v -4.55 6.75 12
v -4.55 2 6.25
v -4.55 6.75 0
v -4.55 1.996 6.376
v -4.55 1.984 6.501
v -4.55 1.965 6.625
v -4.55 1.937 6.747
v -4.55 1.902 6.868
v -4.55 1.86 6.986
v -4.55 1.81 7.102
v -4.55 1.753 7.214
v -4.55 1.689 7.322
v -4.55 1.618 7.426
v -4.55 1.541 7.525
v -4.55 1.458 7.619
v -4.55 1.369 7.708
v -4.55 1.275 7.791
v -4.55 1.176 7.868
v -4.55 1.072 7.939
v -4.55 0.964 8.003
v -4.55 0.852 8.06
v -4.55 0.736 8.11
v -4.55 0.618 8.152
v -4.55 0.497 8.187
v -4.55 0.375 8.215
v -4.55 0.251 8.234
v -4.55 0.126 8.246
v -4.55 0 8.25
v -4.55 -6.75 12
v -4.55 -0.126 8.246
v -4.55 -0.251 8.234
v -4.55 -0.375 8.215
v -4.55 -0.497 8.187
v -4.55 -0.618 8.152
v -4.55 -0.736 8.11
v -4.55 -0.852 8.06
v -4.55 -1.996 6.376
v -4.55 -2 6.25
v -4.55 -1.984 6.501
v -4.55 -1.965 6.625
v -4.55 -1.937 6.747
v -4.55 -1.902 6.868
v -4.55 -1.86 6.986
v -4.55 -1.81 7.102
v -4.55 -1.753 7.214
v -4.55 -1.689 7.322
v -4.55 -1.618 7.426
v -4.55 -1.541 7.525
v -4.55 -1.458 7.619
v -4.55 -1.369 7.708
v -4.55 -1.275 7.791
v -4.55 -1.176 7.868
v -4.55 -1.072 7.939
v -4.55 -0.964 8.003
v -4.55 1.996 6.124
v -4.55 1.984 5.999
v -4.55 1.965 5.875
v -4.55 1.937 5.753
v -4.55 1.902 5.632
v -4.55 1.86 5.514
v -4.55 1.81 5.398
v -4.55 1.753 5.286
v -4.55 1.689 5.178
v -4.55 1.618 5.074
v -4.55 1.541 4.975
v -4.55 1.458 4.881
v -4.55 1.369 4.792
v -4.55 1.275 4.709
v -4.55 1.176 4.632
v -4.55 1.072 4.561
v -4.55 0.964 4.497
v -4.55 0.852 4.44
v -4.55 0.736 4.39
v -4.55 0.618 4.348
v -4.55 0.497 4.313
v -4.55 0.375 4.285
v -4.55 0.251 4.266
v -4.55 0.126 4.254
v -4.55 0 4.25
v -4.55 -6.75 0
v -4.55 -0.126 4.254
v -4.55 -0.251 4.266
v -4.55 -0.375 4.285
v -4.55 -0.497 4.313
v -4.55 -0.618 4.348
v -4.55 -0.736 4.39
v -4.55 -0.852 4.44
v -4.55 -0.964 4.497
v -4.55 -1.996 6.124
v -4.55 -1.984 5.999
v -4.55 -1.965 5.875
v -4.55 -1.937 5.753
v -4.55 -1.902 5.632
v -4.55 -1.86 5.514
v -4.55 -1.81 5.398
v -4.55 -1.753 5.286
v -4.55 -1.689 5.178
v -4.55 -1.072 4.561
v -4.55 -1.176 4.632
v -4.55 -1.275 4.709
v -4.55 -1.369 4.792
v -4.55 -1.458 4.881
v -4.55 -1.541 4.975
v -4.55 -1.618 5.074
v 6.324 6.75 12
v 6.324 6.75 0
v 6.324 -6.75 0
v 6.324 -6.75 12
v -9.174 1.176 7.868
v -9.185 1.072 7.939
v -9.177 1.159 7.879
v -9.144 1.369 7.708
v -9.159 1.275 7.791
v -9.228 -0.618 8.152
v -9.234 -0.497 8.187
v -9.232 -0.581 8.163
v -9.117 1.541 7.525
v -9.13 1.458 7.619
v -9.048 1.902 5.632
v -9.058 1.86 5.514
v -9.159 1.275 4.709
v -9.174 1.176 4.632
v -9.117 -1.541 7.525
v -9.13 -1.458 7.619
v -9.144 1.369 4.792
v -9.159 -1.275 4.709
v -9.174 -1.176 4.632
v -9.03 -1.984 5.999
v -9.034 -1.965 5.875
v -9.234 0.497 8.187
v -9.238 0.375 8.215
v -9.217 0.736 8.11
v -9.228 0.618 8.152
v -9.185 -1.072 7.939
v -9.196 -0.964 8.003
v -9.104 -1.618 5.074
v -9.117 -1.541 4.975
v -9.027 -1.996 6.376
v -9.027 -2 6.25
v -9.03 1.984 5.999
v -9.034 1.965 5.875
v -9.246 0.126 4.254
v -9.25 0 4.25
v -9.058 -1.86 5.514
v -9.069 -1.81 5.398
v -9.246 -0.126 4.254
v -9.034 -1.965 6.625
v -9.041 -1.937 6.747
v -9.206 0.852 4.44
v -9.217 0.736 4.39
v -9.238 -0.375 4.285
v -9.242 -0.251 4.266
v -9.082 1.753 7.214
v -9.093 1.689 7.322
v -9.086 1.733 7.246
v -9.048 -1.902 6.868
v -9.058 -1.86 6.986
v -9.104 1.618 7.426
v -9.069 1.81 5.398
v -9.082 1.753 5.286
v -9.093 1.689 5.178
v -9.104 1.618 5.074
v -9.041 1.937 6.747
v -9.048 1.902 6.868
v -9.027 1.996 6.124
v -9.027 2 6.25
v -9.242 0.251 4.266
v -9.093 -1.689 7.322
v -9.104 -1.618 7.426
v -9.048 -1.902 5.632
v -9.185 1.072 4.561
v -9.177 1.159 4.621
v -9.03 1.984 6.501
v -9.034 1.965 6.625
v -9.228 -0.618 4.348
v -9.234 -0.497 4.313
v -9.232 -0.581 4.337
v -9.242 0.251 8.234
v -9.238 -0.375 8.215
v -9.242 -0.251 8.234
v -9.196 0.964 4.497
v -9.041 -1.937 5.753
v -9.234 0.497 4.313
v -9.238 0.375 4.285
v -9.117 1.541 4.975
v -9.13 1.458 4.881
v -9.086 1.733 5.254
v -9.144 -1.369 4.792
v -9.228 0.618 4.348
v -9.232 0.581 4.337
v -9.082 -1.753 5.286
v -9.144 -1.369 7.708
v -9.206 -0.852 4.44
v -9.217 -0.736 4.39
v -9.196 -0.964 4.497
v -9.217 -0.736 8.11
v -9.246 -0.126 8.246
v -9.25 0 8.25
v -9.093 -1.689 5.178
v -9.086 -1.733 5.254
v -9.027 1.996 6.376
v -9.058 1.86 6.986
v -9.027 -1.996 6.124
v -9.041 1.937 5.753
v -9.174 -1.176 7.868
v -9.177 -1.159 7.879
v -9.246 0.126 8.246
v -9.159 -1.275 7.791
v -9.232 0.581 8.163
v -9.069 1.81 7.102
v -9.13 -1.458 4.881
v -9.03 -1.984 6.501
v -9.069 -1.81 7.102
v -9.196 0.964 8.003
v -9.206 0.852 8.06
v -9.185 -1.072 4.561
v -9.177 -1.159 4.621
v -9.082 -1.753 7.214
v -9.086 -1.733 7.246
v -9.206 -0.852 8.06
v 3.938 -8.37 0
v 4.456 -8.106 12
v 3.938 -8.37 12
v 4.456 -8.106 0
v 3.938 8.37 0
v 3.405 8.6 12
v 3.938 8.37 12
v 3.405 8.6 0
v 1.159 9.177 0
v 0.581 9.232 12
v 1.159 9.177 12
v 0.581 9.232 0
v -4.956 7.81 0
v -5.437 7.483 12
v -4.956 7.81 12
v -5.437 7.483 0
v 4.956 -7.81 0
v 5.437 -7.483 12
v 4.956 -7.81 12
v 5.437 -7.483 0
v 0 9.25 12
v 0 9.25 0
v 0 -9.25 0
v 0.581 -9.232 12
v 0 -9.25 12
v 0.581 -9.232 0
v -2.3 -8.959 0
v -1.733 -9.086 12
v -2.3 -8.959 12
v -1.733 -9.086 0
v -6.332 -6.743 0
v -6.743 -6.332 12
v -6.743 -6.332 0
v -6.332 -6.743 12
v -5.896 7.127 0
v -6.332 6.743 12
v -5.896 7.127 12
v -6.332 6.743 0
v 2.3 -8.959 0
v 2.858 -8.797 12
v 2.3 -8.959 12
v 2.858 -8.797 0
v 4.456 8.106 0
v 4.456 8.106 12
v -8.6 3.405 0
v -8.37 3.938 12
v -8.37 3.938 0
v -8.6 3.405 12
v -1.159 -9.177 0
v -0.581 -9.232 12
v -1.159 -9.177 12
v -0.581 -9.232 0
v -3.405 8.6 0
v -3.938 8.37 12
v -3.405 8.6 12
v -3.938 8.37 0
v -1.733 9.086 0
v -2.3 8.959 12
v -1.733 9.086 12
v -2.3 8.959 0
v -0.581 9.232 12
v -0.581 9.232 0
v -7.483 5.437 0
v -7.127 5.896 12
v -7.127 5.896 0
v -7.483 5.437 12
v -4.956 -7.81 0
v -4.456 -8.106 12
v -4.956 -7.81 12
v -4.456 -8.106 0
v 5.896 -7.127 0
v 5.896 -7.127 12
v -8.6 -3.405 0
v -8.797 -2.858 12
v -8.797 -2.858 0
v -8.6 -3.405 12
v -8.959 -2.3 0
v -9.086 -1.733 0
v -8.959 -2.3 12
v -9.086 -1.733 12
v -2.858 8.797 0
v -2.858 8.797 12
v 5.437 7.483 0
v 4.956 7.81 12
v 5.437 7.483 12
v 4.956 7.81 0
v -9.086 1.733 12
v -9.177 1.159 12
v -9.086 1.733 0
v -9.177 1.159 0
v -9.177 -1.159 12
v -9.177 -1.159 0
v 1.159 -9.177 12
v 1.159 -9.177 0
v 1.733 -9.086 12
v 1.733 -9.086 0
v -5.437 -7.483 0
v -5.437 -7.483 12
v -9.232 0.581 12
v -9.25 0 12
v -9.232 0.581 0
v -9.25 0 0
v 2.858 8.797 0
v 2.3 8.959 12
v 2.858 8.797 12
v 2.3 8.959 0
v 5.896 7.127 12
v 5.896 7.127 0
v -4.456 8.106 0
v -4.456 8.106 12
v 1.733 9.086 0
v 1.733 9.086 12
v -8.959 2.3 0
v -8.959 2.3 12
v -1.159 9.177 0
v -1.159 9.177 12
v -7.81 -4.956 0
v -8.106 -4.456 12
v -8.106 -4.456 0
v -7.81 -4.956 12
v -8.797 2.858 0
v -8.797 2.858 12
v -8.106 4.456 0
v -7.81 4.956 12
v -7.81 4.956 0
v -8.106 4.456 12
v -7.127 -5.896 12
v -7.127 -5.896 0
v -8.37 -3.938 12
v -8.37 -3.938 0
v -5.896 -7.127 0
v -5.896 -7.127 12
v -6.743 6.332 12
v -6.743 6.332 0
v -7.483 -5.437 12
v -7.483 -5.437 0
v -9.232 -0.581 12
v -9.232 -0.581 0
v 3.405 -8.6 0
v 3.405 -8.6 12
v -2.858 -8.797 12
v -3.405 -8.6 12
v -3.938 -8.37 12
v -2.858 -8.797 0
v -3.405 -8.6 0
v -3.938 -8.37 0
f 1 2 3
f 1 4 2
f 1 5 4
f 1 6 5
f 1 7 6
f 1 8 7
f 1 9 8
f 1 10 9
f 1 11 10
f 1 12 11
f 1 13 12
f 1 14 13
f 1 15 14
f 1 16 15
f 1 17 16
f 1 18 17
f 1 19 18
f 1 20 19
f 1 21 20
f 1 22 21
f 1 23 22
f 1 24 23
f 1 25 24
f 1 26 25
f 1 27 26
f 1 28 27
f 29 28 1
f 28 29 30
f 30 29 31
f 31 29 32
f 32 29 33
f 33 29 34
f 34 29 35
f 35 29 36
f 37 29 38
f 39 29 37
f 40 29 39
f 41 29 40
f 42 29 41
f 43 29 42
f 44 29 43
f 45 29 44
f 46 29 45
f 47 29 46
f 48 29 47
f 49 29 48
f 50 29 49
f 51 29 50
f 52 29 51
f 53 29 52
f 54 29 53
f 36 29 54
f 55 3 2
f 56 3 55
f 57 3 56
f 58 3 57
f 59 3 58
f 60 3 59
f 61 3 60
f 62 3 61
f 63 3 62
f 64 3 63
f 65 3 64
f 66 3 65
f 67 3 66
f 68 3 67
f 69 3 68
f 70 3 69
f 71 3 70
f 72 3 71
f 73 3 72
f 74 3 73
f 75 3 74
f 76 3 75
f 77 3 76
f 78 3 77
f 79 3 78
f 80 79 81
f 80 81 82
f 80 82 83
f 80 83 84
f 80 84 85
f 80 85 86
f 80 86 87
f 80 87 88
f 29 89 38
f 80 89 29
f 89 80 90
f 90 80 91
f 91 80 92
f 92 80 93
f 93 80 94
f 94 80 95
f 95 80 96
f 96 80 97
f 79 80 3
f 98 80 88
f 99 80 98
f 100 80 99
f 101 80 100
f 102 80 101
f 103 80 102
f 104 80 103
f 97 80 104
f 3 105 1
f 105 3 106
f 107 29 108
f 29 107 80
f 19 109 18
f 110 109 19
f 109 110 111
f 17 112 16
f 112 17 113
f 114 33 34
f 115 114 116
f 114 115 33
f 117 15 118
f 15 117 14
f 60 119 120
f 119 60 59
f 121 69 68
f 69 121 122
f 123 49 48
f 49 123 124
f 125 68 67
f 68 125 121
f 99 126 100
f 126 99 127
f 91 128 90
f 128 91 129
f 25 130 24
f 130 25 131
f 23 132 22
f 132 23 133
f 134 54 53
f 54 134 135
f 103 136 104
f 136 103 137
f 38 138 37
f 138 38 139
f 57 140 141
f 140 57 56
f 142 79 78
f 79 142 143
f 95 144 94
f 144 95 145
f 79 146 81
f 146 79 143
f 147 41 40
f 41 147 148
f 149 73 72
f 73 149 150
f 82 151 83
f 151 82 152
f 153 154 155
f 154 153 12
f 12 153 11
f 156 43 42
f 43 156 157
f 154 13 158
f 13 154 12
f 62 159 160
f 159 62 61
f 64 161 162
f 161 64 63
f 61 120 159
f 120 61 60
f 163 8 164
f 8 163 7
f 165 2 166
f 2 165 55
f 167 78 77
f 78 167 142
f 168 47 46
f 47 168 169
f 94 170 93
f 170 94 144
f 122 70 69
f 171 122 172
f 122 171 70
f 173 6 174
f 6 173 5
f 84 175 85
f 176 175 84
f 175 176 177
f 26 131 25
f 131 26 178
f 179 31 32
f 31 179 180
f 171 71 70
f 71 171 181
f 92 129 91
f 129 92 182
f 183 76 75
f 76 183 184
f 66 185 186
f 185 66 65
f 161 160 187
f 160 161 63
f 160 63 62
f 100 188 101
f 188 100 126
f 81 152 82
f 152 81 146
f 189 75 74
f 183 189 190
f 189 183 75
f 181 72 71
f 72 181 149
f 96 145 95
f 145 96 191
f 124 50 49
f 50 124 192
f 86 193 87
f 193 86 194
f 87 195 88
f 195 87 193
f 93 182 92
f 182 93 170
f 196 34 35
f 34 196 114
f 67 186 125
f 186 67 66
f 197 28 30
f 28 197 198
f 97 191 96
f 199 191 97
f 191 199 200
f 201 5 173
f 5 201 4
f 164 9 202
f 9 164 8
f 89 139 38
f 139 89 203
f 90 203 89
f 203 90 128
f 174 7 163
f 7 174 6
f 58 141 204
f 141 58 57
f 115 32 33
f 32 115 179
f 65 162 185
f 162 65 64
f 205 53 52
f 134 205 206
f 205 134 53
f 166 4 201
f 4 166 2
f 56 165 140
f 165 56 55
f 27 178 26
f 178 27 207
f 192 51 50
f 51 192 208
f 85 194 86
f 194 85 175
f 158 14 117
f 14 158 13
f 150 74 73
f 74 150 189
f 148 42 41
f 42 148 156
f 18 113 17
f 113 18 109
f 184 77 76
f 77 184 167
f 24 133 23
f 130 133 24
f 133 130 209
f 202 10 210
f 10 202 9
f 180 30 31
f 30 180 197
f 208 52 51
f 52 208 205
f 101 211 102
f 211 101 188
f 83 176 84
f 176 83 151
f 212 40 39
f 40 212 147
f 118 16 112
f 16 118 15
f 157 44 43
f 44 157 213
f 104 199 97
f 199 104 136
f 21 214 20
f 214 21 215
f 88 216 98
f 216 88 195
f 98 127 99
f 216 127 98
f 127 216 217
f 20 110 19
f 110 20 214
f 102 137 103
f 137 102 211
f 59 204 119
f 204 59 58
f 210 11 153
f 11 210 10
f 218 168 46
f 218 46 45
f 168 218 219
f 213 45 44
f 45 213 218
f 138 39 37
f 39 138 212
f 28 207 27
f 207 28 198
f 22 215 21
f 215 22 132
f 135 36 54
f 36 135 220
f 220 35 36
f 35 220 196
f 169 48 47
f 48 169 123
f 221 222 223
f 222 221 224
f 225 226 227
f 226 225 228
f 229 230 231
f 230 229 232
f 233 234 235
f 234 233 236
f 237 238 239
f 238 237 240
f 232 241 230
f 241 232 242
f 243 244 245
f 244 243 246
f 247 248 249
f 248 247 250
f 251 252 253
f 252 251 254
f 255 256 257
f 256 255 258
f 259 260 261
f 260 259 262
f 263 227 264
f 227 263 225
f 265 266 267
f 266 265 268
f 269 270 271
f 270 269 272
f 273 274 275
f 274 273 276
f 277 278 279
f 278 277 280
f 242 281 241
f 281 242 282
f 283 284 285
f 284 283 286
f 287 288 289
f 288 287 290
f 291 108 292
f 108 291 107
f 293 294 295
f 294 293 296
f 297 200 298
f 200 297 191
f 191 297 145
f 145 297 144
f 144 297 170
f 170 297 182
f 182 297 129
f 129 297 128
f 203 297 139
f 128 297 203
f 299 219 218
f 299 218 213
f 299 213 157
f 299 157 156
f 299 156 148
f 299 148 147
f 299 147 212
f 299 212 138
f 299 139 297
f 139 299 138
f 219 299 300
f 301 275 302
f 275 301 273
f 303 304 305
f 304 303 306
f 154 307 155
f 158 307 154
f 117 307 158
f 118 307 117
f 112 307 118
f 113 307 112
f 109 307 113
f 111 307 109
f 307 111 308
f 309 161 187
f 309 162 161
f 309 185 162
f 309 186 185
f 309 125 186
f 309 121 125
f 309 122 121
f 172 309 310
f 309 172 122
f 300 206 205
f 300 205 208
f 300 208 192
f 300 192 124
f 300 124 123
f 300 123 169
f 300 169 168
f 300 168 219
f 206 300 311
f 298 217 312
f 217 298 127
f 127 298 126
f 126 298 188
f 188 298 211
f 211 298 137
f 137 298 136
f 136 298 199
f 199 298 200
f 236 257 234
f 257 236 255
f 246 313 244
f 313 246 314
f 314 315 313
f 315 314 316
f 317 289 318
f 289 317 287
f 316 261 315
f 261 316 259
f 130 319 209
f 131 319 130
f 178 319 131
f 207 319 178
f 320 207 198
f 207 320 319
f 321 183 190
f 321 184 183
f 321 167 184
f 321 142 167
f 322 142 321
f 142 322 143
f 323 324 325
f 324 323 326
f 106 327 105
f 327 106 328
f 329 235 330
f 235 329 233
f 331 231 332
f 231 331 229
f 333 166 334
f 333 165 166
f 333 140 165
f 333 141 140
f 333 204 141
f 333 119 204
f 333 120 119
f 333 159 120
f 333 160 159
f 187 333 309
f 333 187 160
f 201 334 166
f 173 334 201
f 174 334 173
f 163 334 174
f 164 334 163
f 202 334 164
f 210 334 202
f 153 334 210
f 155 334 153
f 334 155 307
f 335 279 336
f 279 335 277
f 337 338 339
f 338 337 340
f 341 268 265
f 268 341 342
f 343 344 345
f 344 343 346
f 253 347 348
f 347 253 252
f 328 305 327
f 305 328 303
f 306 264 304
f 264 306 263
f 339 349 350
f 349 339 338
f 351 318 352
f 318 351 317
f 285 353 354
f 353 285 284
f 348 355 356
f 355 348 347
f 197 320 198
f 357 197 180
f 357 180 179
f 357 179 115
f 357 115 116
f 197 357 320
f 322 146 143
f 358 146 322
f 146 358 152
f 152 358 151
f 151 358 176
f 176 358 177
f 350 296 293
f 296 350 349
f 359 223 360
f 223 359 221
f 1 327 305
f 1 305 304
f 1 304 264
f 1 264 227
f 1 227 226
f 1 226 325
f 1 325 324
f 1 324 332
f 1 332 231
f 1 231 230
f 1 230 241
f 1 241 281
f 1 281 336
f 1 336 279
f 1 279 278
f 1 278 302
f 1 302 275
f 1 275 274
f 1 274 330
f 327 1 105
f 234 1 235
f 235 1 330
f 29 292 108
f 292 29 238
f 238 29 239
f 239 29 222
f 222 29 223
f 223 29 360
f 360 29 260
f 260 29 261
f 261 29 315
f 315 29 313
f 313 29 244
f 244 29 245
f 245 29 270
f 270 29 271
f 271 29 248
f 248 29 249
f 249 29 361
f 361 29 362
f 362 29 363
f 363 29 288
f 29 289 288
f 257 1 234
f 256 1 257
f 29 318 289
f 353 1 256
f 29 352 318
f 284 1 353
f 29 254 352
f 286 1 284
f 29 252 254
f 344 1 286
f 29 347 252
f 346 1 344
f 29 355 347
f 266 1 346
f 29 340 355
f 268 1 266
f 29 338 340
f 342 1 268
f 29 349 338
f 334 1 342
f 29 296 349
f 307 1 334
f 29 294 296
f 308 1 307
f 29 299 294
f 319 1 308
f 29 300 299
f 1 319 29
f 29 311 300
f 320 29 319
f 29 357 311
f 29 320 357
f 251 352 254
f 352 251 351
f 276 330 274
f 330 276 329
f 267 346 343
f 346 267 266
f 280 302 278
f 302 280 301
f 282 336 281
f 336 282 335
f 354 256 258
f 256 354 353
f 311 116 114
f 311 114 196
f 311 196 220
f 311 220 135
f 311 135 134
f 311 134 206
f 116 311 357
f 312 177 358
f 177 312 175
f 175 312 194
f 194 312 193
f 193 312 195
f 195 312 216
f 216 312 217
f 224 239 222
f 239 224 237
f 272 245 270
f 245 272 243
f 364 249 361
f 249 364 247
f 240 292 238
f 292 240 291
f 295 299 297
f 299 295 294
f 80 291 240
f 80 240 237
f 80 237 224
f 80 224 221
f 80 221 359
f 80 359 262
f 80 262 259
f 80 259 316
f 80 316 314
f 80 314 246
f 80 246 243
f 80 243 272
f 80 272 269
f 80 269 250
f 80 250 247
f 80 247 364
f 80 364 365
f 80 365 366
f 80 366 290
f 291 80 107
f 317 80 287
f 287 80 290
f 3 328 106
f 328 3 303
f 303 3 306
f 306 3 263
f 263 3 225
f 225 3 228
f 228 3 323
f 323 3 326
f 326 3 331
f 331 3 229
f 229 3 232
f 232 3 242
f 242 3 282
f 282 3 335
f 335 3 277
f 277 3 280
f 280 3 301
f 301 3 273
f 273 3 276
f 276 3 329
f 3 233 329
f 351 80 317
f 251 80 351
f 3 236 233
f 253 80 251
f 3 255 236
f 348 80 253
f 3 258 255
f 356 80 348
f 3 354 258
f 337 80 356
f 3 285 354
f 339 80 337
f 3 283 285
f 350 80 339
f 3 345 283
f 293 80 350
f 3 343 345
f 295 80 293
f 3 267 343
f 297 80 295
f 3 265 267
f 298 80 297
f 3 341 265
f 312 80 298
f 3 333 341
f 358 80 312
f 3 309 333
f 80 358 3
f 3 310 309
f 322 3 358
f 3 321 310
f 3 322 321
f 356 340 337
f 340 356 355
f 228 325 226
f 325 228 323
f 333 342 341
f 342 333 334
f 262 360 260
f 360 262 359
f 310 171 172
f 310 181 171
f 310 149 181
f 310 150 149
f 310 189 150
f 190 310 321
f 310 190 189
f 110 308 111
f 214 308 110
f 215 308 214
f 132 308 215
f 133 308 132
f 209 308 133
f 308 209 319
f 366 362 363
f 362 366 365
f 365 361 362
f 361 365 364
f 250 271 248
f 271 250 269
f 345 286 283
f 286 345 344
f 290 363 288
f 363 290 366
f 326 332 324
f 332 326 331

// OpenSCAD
difference(){
	union(){
        
       translate([0,0,0]){
            rotate(a = [0,0,0]) {
                cylinder(h=12, r=9.25, $fn=100, center=false);
            }
       }
	}
	union() {
        
       translate([-4.55,-13.5/2,-2]){
           cube([17,13.5,22.5], center=false);
       }
       translate([0,0,12.5/2]){
            rotate(a = [0,90,0]) {
                cylinder(h=600, r=2.0, $fn=100, center=true);
            }
       }			   

        
	}
}
